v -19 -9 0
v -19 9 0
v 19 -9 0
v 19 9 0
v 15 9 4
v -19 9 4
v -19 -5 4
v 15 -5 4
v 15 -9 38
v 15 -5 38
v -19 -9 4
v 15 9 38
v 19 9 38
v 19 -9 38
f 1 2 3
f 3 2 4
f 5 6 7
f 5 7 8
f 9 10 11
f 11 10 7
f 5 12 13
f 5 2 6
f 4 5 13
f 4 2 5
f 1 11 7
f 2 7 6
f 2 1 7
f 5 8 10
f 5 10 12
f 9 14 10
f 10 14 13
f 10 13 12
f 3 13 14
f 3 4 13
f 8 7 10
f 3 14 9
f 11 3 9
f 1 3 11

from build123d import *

# Parameters (mm, degrees)
SKETCH_1_W          = 38
SKETCH_1_H          = 18
EXTRUDE_1_DEPTH     = 4
EXTRUDE_3_DEPTH     = 34
CUT_EXTRUDE_1_DEPTH = 34


with BuildPart() as part:
    # 草图1 → 凸台-拉伸1 (new body)
    with BuildSketch(Plane.XY):
        Rectangle(SKETCH_1_W, SKETCH_1_H)
    extrude(amount=EXTRUDE_1_DEPTH)

    # 草图2 → 凸台-拉伸3 (add)
    with BuildSketch(Plane.XY.offset(4)):
        Polygon((19, 9), (19, -9), (-19, -9), (-19, -5), (15, -5), (15, 9), align=None)
    extrude(amount=EXTRUDE_3_DEPTH)

    # 草图4 → 切除-拉伸1 (cut)
    with BuildSketch(Plane(origin=(0, -5, 0), x_dir=(1, 0, 0), z_dir=(0, 1, 0))):
        Polygon((15, -38), (-19, -4), (-19, -38), align=None)
    extrude(amount=-CUT_EXTRUDE_1_DEPTH, mode=Mode.SUBTRACT)


solid = part.part
